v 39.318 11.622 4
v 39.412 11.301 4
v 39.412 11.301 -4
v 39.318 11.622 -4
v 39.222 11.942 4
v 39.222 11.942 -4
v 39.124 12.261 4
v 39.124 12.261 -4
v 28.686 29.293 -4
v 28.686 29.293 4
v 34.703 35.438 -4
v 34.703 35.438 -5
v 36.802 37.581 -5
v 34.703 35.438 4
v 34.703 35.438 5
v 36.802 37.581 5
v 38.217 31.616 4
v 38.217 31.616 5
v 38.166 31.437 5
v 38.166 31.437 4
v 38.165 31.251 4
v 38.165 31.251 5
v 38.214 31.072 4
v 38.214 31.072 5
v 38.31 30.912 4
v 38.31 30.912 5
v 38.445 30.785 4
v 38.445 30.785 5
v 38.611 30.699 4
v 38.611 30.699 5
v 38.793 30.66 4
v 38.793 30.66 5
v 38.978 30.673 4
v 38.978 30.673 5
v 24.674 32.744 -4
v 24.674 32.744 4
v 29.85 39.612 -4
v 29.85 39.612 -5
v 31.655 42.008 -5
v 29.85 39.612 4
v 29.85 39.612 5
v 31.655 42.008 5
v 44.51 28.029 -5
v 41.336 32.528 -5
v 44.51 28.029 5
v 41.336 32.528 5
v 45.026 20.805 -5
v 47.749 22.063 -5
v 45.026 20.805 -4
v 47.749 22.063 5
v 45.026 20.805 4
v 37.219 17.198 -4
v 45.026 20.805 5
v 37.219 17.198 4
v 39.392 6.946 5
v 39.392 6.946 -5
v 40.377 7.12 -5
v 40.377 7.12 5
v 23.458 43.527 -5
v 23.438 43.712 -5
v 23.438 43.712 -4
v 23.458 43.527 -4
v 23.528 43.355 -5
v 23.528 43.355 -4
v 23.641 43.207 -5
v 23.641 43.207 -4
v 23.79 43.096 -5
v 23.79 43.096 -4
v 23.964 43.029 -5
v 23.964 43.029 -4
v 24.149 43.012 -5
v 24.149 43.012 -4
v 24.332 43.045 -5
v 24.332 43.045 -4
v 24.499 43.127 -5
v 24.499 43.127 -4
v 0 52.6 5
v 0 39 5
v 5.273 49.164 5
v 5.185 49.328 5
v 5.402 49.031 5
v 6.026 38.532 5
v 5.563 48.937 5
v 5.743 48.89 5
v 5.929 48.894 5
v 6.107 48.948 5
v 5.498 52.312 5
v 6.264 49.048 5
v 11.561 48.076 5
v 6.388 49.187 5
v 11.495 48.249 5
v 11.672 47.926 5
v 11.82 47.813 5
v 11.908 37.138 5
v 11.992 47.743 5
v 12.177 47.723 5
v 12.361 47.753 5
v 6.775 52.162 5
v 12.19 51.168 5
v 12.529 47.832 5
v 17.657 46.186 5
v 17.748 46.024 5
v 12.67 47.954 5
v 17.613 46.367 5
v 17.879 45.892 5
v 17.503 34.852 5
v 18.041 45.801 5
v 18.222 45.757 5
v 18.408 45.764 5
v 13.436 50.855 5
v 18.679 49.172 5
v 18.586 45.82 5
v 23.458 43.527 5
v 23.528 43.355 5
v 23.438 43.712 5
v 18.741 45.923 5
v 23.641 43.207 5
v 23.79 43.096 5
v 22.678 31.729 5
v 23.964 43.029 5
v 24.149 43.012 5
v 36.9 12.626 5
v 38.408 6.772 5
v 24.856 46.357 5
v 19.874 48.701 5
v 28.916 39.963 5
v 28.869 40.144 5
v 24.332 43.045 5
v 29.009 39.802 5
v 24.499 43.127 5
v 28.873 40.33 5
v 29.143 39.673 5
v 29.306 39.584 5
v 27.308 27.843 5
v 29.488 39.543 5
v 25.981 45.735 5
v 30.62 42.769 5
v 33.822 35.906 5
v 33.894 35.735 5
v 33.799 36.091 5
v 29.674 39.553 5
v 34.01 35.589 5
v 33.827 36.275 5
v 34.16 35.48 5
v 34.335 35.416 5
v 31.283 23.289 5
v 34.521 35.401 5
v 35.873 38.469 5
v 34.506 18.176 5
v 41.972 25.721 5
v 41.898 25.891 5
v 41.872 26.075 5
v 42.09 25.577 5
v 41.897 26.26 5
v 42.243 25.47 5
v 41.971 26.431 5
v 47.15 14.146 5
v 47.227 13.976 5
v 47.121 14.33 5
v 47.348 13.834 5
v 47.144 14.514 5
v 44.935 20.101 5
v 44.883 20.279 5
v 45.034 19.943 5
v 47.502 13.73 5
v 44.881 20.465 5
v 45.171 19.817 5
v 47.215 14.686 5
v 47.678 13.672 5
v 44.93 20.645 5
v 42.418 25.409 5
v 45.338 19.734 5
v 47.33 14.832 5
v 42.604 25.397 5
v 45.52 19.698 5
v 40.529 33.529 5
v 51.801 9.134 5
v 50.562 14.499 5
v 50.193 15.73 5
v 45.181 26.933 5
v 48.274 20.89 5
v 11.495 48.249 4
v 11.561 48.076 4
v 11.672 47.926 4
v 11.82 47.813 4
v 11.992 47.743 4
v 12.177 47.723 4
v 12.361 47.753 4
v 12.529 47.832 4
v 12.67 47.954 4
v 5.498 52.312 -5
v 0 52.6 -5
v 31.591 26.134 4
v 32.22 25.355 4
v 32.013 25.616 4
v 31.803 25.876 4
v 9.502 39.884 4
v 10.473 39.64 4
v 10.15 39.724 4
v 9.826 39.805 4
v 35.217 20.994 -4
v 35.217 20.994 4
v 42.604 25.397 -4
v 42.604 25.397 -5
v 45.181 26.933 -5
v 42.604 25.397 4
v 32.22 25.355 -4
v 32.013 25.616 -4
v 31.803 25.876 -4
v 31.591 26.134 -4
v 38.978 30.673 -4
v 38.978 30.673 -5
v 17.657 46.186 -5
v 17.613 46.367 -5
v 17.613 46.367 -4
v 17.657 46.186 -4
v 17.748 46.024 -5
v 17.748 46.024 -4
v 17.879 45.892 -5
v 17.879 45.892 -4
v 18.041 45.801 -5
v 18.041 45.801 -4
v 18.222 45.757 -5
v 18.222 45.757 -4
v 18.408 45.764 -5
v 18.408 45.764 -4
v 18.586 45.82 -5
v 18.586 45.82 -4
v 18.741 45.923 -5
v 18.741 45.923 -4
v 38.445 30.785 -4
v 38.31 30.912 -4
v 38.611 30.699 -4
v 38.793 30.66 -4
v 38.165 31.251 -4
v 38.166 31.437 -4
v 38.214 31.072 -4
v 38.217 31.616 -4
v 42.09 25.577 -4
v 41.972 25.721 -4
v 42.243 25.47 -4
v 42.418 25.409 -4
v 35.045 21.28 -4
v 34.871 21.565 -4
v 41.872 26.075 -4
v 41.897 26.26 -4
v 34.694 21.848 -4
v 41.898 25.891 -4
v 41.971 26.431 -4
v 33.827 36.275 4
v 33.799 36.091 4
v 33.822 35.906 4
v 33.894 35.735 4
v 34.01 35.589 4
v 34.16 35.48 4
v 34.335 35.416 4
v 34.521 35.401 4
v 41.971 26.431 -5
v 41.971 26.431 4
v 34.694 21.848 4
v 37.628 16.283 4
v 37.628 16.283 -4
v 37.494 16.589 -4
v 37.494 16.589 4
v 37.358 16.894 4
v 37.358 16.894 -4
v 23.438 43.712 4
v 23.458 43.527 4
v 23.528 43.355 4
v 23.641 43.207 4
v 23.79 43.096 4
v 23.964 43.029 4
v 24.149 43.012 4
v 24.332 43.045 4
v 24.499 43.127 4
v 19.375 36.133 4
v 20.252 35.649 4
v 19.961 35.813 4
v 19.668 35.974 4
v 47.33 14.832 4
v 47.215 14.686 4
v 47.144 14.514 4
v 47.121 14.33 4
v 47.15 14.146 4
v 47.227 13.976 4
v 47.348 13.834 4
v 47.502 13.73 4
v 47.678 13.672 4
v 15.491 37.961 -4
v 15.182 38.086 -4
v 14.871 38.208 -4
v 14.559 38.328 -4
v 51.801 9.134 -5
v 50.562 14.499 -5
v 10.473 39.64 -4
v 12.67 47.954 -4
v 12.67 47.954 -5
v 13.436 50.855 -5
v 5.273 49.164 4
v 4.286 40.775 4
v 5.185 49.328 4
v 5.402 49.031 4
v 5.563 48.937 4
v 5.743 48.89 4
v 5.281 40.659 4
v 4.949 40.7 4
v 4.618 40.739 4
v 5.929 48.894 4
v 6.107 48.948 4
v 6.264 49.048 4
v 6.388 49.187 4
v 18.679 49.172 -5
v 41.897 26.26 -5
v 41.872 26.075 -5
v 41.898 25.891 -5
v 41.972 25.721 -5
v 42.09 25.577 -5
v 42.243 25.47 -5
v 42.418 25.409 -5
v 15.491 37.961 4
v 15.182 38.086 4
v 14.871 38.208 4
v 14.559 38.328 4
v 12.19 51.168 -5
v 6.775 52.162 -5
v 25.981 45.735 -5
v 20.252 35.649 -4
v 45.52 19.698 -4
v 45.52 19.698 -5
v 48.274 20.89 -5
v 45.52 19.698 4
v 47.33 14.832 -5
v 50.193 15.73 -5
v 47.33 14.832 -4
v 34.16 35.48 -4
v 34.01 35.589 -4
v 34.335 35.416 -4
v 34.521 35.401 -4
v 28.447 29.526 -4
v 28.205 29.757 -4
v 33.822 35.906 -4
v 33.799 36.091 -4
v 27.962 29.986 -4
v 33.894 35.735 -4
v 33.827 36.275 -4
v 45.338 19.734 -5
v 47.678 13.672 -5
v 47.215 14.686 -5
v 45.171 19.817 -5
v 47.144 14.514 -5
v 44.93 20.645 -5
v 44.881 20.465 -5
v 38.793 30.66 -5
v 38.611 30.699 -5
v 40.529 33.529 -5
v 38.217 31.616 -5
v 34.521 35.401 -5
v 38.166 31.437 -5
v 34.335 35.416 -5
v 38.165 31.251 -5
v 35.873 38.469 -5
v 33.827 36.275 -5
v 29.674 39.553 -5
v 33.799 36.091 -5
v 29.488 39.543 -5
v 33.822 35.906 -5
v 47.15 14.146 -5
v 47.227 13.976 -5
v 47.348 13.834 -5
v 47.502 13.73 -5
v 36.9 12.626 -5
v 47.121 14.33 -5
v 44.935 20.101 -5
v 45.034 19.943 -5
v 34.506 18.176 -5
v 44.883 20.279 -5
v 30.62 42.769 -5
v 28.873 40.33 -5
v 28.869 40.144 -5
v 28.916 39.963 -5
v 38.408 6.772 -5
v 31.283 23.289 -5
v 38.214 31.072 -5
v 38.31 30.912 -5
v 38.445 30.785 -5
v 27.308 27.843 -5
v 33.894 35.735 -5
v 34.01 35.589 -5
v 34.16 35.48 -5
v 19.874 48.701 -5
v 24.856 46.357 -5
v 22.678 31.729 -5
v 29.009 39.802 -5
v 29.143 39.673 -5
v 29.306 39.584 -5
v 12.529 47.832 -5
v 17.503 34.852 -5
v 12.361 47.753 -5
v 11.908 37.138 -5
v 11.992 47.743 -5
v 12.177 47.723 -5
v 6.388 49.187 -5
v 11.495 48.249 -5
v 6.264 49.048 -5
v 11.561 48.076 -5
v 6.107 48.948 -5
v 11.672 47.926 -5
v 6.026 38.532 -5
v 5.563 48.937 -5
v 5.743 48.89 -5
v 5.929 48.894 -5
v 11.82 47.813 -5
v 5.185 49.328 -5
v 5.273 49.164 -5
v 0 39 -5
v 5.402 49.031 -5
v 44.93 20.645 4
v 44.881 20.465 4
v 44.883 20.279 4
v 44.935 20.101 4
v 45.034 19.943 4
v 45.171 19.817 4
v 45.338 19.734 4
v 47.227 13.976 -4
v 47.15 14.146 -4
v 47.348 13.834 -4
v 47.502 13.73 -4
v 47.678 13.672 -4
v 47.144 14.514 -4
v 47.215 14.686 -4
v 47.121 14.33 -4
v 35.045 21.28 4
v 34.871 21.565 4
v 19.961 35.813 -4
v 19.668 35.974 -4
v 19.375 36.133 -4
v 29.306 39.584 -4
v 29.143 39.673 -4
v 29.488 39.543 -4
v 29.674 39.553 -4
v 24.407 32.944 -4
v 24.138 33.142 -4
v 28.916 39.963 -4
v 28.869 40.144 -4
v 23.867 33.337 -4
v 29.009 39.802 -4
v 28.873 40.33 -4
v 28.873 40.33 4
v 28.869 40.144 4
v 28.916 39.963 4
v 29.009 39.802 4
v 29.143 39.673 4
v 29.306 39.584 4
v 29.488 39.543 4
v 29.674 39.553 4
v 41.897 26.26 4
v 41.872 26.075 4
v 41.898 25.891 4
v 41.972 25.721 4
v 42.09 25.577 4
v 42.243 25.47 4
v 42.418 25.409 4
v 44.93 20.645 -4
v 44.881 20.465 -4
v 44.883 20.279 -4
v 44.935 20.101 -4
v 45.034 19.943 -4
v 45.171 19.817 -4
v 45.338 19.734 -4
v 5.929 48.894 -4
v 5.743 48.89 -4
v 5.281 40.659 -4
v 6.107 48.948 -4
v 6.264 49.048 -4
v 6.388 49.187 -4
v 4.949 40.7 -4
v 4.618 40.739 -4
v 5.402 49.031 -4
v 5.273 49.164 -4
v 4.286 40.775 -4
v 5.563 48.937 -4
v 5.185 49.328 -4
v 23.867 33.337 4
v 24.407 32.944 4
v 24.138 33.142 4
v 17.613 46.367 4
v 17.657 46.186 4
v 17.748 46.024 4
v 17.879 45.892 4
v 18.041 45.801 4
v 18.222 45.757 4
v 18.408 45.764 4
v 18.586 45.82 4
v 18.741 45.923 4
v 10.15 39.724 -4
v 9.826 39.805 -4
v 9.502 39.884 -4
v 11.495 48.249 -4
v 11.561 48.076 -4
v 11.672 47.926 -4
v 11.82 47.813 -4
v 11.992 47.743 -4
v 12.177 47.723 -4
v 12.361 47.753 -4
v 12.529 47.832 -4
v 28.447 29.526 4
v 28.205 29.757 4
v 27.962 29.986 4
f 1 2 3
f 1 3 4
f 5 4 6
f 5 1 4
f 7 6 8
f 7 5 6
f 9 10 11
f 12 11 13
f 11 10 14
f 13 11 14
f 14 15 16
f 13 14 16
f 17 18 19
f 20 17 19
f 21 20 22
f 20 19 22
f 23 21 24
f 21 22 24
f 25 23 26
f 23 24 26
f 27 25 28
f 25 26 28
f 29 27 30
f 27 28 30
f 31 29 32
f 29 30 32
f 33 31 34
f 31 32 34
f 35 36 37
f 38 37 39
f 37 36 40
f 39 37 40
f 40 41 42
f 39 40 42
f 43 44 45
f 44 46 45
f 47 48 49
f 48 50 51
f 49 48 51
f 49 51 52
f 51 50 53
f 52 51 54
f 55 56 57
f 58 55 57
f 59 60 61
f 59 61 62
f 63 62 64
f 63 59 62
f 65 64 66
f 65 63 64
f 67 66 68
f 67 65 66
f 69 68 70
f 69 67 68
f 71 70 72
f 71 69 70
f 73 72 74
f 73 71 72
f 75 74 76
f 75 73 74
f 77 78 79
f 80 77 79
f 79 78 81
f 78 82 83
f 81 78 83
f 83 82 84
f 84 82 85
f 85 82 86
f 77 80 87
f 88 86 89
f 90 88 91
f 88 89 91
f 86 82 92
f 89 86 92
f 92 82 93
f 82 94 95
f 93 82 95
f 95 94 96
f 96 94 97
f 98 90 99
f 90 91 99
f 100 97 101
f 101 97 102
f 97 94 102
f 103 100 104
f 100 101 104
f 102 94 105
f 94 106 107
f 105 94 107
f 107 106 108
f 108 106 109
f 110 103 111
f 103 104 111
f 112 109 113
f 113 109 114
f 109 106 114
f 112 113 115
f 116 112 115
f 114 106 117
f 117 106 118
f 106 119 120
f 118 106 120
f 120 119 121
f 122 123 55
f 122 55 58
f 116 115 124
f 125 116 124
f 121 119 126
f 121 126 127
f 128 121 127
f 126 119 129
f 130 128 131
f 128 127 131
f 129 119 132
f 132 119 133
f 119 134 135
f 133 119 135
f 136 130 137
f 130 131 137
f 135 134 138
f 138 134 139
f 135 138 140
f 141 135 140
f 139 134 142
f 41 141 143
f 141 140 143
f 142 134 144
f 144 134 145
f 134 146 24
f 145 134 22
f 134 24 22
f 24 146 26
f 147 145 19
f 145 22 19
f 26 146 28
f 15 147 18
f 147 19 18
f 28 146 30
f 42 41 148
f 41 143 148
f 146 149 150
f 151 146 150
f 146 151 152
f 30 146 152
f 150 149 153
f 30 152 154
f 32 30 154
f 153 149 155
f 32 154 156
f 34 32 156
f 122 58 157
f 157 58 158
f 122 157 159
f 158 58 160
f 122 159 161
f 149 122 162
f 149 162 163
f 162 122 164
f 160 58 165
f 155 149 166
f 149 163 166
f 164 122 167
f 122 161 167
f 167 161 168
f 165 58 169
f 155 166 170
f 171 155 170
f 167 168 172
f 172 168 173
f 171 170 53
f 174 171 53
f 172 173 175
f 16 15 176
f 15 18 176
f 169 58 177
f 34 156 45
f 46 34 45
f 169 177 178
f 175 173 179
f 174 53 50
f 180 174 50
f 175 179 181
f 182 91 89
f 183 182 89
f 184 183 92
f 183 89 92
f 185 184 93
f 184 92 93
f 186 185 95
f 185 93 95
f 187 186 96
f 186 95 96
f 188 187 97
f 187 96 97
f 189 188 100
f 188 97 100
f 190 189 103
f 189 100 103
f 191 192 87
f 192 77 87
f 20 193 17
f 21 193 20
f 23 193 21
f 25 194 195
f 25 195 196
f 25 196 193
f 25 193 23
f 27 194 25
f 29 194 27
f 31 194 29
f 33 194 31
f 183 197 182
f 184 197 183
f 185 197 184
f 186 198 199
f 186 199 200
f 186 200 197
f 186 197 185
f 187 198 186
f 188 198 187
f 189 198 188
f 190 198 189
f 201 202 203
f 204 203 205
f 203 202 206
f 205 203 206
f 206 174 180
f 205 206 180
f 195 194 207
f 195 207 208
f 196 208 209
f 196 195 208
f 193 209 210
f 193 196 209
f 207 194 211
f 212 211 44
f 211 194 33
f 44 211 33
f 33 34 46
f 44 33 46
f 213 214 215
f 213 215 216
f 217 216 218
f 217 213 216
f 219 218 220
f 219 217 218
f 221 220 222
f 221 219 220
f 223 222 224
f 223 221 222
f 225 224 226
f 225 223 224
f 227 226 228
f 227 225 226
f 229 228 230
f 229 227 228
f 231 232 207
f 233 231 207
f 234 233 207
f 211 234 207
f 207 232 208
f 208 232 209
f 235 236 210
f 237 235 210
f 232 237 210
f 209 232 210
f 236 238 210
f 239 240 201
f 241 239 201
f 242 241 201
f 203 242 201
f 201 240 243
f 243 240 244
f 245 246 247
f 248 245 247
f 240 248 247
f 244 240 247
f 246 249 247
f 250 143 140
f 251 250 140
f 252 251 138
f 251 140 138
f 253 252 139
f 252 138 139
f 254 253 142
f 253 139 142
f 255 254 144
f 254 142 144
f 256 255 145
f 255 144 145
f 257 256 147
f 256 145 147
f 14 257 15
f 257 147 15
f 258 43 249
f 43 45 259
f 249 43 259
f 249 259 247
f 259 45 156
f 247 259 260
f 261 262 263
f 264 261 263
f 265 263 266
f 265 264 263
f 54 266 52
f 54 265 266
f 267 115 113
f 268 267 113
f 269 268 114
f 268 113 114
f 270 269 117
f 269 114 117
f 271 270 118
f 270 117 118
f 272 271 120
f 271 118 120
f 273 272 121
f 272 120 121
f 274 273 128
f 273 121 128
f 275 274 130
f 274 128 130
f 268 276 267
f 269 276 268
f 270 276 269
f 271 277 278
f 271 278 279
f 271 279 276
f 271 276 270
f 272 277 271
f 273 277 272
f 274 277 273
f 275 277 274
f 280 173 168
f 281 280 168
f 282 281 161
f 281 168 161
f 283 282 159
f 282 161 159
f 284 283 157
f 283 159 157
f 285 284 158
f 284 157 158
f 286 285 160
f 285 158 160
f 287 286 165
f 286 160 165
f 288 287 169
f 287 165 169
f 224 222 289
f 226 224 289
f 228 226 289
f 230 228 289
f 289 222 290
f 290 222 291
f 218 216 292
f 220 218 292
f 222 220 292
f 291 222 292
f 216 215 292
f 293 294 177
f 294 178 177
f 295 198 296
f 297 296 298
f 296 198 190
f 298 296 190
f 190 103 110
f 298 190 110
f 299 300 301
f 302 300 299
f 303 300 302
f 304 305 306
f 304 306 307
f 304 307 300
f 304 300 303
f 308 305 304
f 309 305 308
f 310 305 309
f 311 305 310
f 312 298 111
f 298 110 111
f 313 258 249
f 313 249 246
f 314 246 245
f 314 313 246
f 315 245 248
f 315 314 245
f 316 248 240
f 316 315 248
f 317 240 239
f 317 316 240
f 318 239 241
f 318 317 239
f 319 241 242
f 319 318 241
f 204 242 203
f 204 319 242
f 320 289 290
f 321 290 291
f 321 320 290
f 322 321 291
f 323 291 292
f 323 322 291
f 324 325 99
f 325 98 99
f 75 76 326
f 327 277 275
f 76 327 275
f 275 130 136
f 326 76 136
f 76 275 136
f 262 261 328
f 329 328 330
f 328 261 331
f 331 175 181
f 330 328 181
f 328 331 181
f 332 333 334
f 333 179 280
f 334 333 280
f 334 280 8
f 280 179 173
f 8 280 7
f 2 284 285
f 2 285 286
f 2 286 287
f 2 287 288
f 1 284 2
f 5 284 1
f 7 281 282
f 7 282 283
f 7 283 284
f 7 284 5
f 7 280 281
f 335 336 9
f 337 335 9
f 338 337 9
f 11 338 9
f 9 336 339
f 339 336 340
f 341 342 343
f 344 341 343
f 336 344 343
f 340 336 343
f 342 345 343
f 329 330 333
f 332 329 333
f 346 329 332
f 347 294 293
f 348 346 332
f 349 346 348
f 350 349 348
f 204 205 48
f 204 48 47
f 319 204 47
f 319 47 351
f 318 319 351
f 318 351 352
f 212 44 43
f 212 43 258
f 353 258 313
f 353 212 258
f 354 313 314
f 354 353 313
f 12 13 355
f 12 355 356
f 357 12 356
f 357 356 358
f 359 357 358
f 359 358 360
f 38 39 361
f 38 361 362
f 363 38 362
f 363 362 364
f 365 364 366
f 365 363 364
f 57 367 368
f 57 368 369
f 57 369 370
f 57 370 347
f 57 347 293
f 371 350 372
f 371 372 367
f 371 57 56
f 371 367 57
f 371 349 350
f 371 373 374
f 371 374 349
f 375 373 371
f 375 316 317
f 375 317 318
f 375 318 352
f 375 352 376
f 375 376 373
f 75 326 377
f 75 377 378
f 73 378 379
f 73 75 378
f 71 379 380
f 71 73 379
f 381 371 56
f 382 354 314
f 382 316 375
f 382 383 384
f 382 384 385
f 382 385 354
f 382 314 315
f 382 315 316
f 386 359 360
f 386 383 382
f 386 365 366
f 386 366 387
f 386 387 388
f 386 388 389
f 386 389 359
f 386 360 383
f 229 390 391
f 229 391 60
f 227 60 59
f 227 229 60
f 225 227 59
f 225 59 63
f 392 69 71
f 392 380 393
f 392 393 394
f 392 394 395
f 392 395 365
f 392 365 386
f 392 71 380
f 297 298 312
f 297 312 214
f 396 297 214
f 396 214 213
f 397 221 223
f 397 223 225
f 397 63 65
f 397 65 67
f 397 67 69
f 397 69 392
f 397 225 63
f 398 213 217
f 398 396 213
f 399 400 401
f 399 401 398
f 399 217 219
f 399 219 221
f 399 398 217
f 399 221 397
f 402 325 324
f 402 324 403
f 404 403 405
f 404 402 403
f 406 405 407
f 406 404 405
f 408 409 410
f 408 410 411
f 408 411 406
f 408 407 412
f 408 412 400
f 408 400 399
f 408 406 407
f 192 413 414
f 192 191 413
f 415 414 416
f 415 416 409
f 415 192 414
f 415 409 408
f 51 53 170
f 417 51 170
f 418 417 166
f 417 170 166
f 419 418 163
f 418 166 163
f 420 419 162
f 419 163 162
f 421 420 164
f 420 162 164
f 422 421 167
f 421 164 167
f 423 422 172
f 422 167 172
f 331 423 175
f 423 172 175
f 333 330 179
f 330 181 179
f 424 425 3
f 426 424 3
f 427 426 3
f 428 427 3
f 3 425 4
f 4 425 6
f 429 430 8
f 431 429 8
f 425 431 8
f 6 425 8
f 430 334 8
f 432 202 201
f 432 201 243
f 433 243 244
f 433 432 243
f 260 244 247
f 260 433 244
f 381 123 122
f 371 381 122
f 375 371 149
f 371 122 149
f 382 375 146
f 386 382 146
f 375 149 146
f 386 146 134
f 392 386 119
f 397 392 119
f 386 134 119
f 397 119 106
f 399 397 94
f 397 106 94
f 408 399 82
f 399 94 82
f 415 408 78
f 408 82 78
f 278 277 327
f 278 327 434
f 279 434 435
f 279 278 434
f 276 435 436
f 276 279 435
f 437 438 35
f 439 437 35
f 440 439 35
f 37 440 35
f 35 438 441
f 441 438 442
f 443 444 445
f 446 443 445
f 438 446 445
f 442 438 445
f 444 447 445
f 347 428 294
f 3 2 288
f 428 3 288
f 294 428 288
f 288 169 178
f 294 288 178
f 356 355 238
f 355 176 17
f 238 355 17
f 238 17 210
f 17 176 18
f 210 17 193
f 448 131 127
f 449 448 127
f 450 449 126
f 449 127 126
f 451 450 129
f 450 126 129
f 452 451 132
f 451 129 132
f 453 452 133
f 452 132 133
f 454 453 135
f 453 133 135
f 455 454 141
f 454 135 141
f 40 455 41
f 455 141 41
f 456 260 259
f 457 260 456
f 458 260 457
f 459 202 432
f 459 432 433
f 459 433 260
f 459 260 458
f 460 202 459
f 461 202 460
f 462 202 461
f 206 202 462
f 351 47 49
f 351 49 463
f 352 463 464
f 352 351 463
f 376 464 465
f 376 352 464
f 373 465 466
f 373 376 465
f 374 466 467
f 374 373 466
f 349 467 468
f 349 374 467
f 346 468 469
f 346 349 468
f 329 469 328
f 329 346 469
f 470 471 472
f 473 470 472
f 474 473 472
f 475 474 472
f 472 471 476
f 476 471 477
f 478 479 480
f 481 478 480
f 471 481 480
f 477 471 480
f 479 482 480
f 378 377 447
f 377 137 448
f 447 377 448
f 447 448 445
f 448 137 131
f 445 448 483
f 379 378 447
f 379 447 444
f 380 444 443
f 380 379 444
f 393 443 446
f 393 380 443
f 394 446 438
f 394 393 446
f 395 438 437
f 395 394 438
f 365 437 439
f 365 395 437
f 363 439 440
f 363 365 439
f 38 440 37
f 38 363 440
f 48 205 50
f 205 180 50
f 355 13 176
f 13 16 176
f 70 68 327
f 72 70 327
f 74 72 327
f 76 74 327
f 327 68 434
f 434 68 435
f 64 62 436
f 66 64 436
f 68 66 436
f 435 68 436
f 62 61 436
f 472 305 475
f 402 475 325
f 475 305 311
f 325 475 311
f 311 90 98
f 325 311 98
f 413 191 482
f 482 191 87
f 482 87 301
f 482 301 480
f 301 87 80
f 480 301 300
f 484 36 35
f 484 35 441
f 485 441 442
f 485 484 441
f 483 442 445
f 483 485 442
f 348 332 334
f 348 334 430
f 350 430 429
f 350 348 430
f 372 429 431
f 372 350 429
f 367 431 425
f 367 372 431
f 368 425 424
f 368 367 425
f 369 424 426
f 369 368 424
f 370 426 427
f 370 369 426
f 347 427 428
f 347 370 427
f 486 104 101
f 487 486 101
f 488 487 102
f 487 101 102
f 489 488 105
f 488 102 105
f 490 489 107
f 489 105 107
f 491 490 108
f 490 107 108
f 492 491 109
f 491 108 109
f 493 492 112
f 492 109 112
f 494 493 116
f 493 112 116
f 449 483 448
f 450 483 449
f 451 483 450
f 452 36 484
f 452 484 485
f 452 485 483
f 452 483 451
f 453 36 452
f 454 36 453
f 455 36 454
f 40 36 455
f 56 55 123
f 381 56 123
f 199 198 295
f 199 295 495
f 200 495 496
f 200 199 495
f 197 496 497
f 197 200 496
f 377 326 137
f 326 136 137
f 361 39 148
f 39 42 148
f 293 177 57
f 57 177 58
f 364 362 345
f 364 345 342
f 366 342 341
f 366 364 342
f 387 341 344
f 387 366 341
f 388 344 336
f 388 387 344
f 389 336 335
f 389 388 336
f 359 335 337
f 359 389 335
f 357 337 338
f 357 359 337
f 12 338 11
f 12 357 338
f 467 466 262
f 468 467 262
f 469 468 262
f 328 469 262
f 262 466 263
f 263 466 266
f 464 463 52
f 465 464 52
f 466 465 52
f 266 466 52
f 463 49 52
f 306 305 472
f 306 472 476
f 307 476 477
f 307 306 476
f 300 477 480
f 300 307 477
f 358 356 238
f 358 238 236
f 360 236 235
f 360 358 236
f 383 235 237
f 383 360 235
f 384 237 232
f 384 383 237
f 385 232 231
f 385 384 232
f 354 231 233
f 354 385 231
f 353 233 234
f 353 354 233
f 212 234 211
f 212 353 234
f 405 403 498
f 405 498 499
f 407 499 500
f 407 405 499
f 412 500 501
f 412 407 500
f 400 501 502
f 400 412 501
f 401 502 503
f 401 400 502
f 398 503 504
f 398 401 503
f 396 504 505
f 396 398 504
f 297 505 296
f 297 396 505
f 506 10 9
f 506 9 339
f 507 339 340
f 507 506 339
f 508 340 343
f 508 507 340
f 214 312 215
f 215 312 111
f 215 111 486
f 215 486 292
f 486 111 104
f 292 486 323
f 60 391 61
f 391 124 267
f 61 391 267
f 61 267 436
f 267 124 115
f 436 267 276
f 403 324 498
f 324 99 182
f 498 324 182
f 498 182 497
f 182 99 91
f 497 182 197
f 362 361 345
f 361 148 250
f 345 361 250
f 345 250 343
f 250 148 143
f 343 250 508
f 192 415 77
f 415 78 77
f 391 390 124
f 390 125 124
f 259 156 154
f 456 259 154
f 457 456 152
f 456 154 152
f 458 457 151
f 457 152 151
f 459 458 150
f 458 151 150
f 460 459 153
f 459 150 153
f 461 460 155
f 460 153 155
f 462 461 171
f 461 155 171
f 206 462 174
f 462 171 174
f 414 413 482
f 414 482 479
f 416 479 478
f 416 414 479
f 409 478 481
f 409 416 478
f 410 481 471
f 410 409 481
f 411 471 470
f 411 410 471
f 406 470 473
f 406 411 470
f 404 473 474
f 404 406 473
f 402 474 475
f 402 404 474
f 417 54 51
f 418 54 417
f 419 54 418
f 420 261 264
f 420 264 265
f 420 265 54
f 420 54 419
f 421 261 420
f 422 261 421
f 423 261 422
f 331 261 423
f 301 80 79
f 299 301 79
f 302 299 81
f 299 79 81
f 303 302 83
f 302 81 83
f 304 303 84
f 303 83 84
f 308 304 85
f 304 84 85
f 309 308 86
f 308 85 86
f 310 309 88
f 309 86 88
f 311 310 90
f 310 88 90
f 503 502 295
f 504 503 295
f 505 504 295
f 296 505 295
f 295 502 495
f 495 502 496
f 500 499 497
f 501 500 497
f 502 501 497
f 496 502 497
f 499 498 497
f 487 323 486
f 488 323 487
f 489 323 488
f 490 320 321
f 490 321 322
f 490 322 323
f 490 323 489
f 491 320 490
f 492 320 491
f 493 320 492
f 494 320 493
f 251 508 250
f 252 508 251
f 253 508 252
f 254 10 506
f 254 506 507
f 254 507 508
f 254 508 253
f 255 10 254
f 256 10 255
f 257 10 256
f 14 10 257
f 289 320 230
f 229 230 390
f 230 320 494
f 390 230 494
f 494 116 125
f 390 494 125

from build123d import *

# Parameters (mm, degrees)
AUFSATZ_LINEAR_AUSTRAGEN1_DEPTH = 5
AUFSATZ_LINEAR_AUSTRAGEN2_DEPTH = 5
KREISMUSTER1_COUNT              = 11
KREISMUSTER1_ANGLE              = 74
AUFSATZ_LINEAR_AUSTRAGEN3_DEPTH = 5
AUFSATZ_LINEAR_AUSTRAGEN4_DEPTH = 1
KREISMUSTER2_COUNT              = 10
KREISMUSTER2_ANGLE              = 66.6
KREISMUSTER2_COPY_1_DEPTH       = 1
KREISMUSTER2_COPY_2_DEPTH       = 1
KREISMUSTER2_COPY_3_DEPTH       = 1
KREISMUSTER2_COPY_4_DEPTH       = 1
KREISMUSTER2_COPY_5_DEPTH       = 1
KREISMUSTER2_COPY_6_DEPTH       = 1
KREISMUSTER2_COPY_7_DEPTH       = 1
KREISMUSTER2_COPY_8_DEPTH       = 1
KREISMUSTER2_COPY_9_DEPTH       = 1


with BuildPart() as part:
    # Skizze1 → Aufsatz-Linear austragen1 (new, symmetric)
    with BuildSketch(Plane.XY):
        with BuildLine():
            Line((0, 41), (0, 40))
            ThreePointArc((0, 40), (25.711504387, 30.641777725), (39.39231012, 6.945927107))
            Line((39.39231012, 6.945927107), (40.377117874, 7.119575284))
            ThreePointArc((40.377117874, 7.119575284), (26.354291997, 31.407822168), (0, 41))
        make_face()
    extrude(amount=AUFSATZ_LINEAR_AUSTRAGEN1_DEPTH, both=True)

    # Skizze2 → Aufsatz-Linear austragen2 (add, symmetric)
    with BuildSketch(Plane.XY):
        with BuildLine():
            Line((0, 52.6), (0, 41))
            ThreePointArc((0, 41), (2.145774206, 40.943810925), (4.285666994, 40.77539771))
            Line((4.285666994, 40.77539771), (5.498197168, 52.311851696))
            Line((5.498197168, 52.311851696), (0, 52.6))
        make_face()
    aufsatz_linear_austragen2 = extrude(amount=AUFSATZ_LINEAR_AUSTRAGEN2_DEPTH, both=True)

    # Kreismuster1: Aufsatz-Linear austragen2 ×11 about axis
    kreismuster1_axis = Axis((0, 0, -5.5), (0, 0, -1))
    for i in range(1, KREISMUSTER1_COUNT):
        add(aufsatz_linear_austragen2.rotate(kreismuster1_axis, i * KREISMUSTER1_ANGLE / (KREISMUSTER1_COUNT - 1)))

    # Skizze3 → Aufsatz-Linear austragen3 (add, symmetric)
    with BuildSketch(Plane.XY):
        with BuildLine():
            ThreePointArc((39.39231012, 6.945927107), (25.711504387, 30.641777725), (0, 40))
            Line((0, 40), (0, 39))
            ThreePointArc((0, 39), (25.068716778, 29.875733282), (38.407502367, 6.772278929))
            Line((38.407502367, 6.772278929), (39.39231012, 6.945927107))
        make_face()
    extrude(amount=AUFSATZ_LINEAR_AUSTRAGEN3_DEPTH, both=True)

    # Skizze4 → Aufsatz-Linear austragen4 (add)
    with BuildSketch(Plane(origin=(0, 0, -5), x_dir=(-1, 0, 0), z_dir=(0, 0, -1))):
        with BuildLine():
            Line((-47.678364885, 13.671551131), (-39.411729533, 11.301131588))
            Line((-39.411729533, 11.301131588), (-39.123853469, 12.260672482))
            Line((-39.123853469, 12.260672482), (-47.330106633, 14.832356338))
            ThreePointArc((-47.330106633, 14.832356338), (-47.149949209, 14.145662676), (-47.678364885, 13.671551131))
        make_face()
    aufsatz_linear_austragen4 = extrude(amount=-AUFSATZ_LINEAR_AUSTRAGEN4_DEPTH)

    # Spiegeln1: Aufsatz-Linear austragen4 across plane
    add(aufsatz_linear_austragen4.mirror(Plane.XY))

    # Kreismuster2: Aufsatz-Linear austragen4 ×10 about axis
    kreismuster2_axis = Axis((0, 0, -5.5), (0, 0, 1))
    for i in range(1, KREISMUSTER2_COUNT):
        add(aufsatz_linear_austragen4.rotate(kreismuster2_axis, i * KREISMUSTER2_ANGLE / (KREISMUSTER2_COUNT - 1)))

    # Kreismuster2 copy 1 sketch → Kreismuster2 copy 1 (add)
    with BuildSketch(Plane(origin=(0, 0, 5), x_dir=(-0.9916711623830904, -0.12879559657756307, 0), z_dir=(0, 0, 1))):
        with BuildLine():
            Line((-47.678364885, -13.671551131), (-39.411729533, -11.301131588))
            Line((-39.411729533, -11.301131588), (-39.123853469, -12.260672482))
            Line((-39.123853469, -12.260672482), (-47.330106633, -14.832356338))
            ThreePointArc((-47.330106633, -14.832356338), (-47.149949209, -14.145662676), (-47.678364885, -13.671551131))
        make_face()
    extrude(amount=-KREISMUSTER2_COPY_1_DEPTH)

    # Kreismuster2 copy 2 sketch → Kreismuster2 copy 2 (add)
    with BuildSketch(Plane(origin=(0, 0, 5), x_dir=(-0.9668233886044593, -0.2554457579357911, 0), z_dir=(0, 0, 1))):
        with BuildLine():
            Line((-47.678364885, -13.671551131), (-39.411729533, -11.301131588))
            Line((-39.411729533, -11.301131588), (-39.123853469, -12.260672482))
            Line((-39.123853469, -12.260672482), (-47.330106633, -14.832356338))
            ThreePointArc((-47.330106633, -14.832356338), (-47.149949209, -14.145662676), (-47.678364885, -13.671551131))
        make_face()
    extrude(amount=-KREISMUSTER2_COPY_2_DEPTH)

    # Kreismuster2 copy 3 sketch → Kreismuster2 copy 3 (add)
    with BuildSketch(Plane(origin=(0, 0, 5), x_dir=(-0.9258705848099944, -0.37784078681846794, 0), z_dir=(0, 0, 1))):
        with BuildLine():
            Line((-47.678364885, -13.671551131), (-39.411729533, -11.301131588))
            Line((-39.411729533, -11.301131588), (-39.123853469, -12.260672482))
            Line((-39.123853469, -12.260672482), (-47.330106633, -14.832356338))
            ThreePointArc((-47.330106633, -14.832356338), (-47.149949209, -14.145662676), (-47.678364885, -13.671551131))
        make_face()
    extrude(amount=-KREISMUSTER2_COPY_3_DEPTH)

    # Kreismuster2 copy 4 sketch → Kreismuster2 copy 4 (add)
    with BuildSketch(Plane(origin=(0, 0, 5), x_dir=(-0.8694949295052185, -0.493941866584232, 0), z_dir=(0, 0, 1))):
        with BuildLine():
            Line((-47.678364885, -13.671551131), (-39.411729533, -11.301131588))
            Line((-39.411729533, -11.301131588), (-39.123853469, -12.260672482))
            Line((-39.123853469, -12.260672482), (-47.330106633, -14.832356338))
            ThreePointArc((-47.330106633, -14.832356338), (-47.149949209, -14.145662676), (-47.678364885, -13.671551131))
        make_face()
    extrude(amount=-KREISMUSTER2_COPY_4_DEPTH)

    # Kreismuster2 copy 5 sketch → Kreismuster2 copy 5 (add)
    with BuildSketch(Plane(origin=(0, 0, 5), x_dir=(-0.7986355100472919, -0.6018150231520494, 0), z_dir=(0, 0, 1))):
        with BuildLine():
            Line((-47.678364885, -13.671551131), (-39.411729533, -11.301131588))
            Line((-39.411729533, -11.301131588), (-39.123853469, -12.260672482))
            Line((-39.123853469, -12.260672482), (-47.330106633, -14.832356338))
            ThreePointArc((-47.330106633, -14.832356338), (-47.149949209, -14.145662676), (-47.678364885, -13.671551131))
        make_face()
    extrude(amount=-KREISMUSTER2_COPY_5_DEPTH)

    # Kreismuster2 copy 6 sketch → Kreismuster2 copy 6 (add)
    with BuildSketch(Plane(origin=(0, 0, 5), x_dir=(-0.7144726796328021, -0.6996633405133666, 0), z_dir=(0, 0, 1))):
        with BuildLine():
            Line((-47.678364885, -13.671551131), (-39.411729533, -11.301131588))
            Line((-39.411729533, -11.301131588), (-39.123853469, -12.260672482))
            Line((-39.123853469, -12.260672482), (-47.330106633, -14.832356338))
            ThreePointArc((-47.330106633, -14.832356338), (-47.149949209, -14.145662676), (-47.678364885, -13.671551131))
        make_face()
    extrude(amount=-KREISMUSTER2_COPY_6_DEPTH)

    # Kreismuster2 copy 7 sketch → Kreismuster2 copy 7 (add)
    with BuildSketch(Plane(origin=(0, 0, 5), x_dir=(-0.6184083953575527, -0.7858568931754031, 0), z_dir=(0, 0, 1))):
        with BuildLine():
            Line((-47.678364885, -13.671551131), (-39.411729533, -11.301131588))
            Line((-39.411729533, -11.301131588), (-39.123853469, -12.260672482))
            Line((-39.123853469, -12.260672482), (-47.330106633, -14.832356338))
            ThreePointArc((-47.330106633, -14.832356338), (-47.149949209, -14.145662676), (-47.678364885, -13.671551131))
        make_face()
    extrude(amount=-KREISMUSTER2_COPY_7_DEPTH)

    # Kreismuster2 copy 8 sketch → Kreismuster2 copy 8 (add)
    with BuildSketch(Plane(origin=(0, 0, 5), x_dir=(-0.5120428648705696, -0.8589598969306655, 0), z_dir=(0, 0, 1))):
        with BuildLine():
            Line((-47.678364885, -13.671551131), (-39.411729533, -11.301131588))
            Line((-39.411729533, -11.301131588), (-39.123853469, -12.260672482))
            Line((-39.123853469, -12.260672482), (-47.330106633, -14.832356338))
            ThreePointArc((-47.330106633, -14.832356338), (-47.149949209, -14.145662676), (-47.678364885, -13.671551131))
        make_face()
    extrude(amount=-KREISMUSTER2_COPY_8_DEPTH)

    # Kreismuster2 copy 9 sketch → Kreismuster2 copy 9 (add)
    with BuildSketch(Plane(origin=(0, 0, 5), x_dir=(-0.3971478906347781, -0.9177546256839823, 0), z_dir=(0, 0, 1))):
        with BuildLine():
            Line((-47.678364885, -13.671551131), (-39.411729533, -11.301131588))
            Line((-39.411729533, -11.301131588), (-39.123853469, -12.260672482))
            Line((-39.123853469, -12.260672482), (-47.330106633, -14.832356338))
            ThreePointArc((-47.330106633, -14.832356338), (-47.149949209, -14.145662676), (-47.678364885, -13.671551131))
        make_face()
    extrude(amount=-KREISMUSTER2_COPY_9_DEPTH)


solid = part.part
